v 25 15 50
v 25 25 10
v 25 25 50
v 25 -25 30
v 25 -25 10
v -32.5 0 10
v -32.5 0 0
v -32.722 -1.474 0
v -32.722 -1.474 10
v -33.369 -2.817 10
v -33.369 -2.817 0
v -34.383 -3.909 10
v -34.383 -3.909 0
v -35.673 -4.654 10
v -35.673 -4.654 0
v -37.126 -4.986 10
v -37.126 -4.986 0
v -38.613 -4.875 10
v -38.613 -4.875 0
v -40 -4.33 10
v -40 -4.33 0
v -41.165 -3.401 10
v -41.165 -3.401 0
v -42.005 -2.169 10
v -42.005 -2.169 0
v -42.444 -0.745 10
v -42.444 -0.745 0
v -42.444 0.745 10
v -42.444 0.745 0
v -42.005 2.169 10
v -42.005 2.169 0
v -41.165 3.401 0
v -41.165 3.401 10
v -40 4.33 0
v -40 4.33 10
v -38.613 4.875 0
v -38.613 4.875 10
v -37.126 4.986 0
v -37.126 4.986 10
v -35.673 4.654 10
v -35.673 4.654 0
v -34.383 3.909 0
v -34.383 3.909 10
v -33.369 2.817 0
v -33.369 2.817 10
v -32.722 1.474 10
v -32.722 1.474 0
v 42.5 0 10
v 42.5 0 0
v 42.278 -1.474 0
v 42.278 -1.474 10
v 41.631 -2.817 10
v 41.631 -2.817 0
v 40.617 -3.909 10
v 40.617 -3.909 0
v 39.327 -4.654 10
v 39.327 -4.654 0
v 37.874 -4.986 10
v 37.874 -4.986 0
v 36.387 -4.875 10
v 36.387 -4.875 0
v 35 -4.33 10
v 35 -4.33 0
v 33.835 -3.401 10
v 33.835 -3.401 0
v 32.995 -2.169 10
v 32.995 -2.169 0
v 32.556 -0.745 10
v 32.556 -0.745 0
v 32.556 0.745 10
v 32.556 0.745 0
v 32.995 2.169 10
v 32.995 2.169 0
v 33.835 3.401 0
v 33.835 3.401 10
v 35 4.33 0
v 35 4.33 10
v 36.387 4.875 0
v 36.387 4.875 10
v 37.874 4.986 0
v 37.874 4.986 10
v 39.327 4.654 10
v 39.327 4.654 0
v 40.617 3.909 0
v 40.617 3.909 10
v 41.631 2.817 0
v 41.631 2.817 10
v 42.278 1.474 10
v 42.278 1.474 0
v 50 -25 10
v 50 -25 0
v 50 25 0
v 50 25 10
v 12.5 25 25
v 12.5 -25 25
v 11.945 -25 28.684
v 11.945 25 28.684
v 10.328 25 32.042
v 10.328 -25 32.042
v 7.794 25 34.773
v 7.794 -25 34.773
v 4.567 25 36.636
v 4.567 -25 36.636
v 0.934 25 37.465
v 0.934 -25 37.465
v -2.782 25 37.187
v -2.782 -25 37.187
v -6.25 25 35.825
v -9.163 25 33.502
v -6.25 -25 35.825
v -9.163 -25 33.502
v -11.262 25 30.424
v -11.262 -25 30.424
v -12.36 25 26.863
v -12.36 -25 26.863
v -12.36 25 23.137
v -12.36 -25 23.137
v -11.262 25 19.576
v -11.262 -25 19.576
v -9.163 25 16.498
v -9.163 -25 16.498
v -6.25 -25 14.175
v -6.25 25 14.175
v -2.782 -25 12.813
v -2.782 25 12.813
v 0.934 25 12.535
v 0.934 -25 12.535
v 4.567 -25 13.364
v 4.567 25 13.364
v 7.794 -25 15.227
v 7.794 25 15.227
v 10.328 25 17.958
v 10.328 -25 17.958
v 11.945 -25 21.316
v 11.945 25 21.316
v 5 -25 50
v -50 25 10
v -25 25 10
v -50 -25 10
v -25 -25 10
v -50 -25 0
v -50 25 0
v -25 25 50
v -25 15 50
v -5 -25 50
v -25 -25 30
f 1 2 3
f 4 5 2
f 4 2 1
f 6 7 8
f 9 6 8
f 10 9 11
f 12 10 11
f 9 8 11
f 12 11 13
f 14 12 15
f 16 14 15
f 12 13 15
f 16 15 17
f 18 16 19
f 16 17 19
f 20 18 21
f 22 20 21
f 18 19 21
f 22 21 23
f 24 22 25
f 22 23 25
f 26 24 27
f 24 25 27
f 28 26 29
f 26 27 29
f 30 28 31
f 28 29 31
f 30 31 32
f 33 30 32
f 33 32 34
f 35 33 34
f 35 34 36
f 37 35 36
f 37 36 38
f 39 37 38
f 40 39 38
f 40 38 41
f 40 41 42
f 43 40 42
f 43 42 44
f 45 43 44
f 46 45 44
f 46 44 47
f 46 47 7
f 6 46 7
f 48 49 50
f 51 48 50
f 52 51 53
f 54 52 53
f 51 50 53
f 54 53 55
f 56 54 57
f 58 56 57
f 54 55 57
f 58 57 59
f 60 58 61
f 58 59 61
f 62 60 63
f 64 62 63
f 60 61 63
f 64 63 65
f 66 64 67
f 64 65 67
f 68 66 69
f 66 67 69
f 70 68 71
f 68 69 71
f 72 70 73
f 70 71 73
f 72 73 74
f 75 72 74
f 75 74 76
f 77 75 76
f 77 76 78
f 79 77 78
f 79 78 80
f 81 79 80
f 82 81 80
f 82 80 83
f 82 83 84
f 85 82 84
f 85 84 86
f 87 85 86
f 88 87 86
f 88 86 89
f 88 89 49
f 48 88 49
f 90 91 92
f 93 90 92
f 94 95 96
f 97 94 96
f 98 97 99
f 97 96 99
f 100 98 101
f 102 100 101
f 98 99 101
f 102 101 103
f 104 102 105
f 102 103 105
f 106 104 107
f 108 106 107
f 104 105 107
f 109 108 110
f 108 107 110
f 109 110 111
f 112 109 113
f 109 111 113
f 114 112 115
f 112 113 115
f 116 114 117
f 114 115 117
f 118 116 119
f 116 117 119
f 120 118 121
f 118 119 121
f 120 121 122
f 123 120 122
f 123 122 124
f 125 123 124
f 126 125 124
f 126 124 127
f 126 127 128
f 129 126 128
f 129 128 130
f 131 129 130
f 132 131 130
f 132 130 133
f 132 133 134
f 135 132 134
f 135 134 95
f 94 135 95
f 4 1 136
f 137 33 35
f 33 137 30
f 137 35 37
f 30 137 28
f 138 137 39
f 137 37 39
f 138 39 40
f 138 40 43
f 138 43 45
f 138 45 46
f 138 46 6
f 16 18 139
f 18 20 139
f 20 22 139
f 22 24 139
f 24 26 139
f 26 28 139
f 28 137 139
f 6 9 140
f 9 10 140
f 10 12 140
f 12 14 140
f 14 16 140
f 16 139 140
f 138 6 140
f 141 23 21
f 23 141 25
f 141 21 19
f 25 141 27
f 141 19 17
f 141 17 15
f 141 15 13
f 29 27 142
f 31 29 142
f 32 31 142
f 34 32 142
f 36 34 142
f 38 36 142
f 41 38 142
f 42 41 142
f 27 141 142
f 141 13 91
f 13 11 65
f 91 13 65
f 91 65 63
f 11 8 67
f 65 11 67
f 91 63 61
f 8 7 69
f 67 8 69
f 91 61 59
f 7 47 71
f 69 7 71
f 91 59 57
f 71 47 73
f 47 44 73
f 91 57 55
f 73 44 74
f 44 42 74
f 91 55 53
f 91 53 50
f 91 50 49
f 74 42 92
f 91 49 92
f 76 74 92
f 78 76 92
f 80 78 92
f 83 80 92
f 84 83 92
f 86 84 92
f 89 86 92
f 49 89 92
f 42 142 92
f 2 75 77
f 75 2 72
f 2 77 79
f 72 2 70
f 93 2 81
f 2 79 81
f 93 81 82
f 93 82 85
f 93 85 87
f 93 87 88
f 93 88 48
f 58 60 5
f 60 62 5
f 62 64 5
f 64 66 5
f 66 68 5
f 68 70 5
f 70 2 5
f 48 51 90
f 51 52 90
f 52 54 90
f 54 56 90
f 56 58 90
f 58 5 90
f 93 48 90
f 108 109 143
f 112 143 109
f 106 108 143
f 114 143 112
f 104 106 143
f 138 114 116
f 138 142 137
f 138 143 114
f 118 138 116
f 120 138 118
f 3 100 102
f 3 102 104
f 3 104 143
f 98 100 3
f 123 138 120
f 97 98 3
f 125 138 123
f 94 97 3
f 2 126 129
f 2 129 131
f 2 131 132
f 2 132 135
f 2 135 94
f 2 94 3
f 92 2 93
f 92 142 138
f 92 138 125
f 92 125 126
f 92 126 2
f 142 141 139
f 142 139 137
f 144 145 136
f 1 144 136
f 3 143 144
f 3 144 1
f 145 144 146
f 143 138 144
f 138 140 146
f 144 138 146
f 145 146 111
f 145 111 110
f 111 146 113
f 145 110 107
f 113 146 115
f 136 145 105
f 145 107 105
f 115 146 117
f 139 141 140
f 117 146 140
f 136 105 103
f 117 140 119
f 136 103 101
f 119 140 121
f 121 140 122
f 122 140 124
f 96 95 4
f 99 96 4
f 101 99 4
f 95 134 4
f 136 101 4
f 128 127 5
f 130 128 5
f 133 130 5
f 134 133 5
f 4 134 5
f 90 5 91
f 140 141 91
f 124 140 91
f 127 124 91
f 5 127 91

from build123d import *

# Parameters (mm, degrees)
F0_W      = 100
F0_H      = 50
F1_DEPTH  = 50
F2_R      = 12.5
F3_DEPTH  = 50.001
F4_W      = 25
F4_H      = 40
F5_DEPTH  = 50.001
F6_R      = 5
F7_DEPTH  = 50.001
F12_W     = 63.2883179933
F12_H     = 65.7318904996
F13_DEPTH = 13.3333333333
F18_W     = 70.068154484
F18_H     = 62.6709284261
F19_DEPTH = 40


with BuildPart() as f1:
    # F0 (on Top) → F1 (new body)
    with BuildSketch(Plane.XY):
        Rectangle(F0_W, F0_H)
    extrude(amount=F1_DEPTH)

    # F2 (on face) → F3 (cut, through all)
    with BuildSketch(Plane.XZ.offset(25)):
        with Locations((0, 25)):
            Circle(F2_R)
    extrude(amount=-F3_DEPTH, mode=Mode.SUBTRACT)

    # F4 (on face) → F5 (cut, through all)
    with BuildSketch(Plane.XZ.offset(25)):
        with Locations((-37.5, 30)):
            Rectangle(F4_W, F4_H)
        with Locations((37.5, 30)):
            Rectangle(F4_W, F4_H)
    extrude(amount=-F5_DEPTH, mode=Mode.SUBTRACT)

    # F6 (on face) → F7 (cut, through all)
    with BuildSketch(Plane(origin=(0, 0, 0), x_dir=(1, 0, 0), z_dir=(0, 0, -1))):
        with Locations((-37.5, 0)):
            Circle(F6_R)
        with Locations((37.5, 0)):
            Circle(F6_R)
    extrude(amount=-F7_DEPTH, mode=Mode.SUBTRACT)

    # F12 (on plane+point) → F13 (cut, through all)
    with BuildSketch(Plane(origin=(38.8888888889, -19.4444444444, 38.8888888889), x_dir=(-0.2357022604, -0.9428090416, -0.2357022604), z_dir=(-0.6666666667, 0.3333333333, -0.6666666667))):
        with Locations((-9.0131862089, 14.5010352135)):
            Rectangle(F12_W, F12_H)
    extrude(amount=F13_DEPTH, mode=Mode.SUBTRACT)

    # F18 (on offset) → F19 (cut, through all)
    with BuildSketch(Plane(origin=(-56.6666666667, -28.3333333333, 56.6666666667), x_dir=(0.2357022604, -0.9428090416, -0.2357022604), z_dir=(-0.6666666667, -0.3333333333, 0.6666666667))):
        with Locations((-7.6787043363, 18.9961208962)):
            Rectangle(F18_W, F18_H)
    extrude(amount=-F19_DEPTH, mode=Mode.SUBTRACT)


solid = f1.part
